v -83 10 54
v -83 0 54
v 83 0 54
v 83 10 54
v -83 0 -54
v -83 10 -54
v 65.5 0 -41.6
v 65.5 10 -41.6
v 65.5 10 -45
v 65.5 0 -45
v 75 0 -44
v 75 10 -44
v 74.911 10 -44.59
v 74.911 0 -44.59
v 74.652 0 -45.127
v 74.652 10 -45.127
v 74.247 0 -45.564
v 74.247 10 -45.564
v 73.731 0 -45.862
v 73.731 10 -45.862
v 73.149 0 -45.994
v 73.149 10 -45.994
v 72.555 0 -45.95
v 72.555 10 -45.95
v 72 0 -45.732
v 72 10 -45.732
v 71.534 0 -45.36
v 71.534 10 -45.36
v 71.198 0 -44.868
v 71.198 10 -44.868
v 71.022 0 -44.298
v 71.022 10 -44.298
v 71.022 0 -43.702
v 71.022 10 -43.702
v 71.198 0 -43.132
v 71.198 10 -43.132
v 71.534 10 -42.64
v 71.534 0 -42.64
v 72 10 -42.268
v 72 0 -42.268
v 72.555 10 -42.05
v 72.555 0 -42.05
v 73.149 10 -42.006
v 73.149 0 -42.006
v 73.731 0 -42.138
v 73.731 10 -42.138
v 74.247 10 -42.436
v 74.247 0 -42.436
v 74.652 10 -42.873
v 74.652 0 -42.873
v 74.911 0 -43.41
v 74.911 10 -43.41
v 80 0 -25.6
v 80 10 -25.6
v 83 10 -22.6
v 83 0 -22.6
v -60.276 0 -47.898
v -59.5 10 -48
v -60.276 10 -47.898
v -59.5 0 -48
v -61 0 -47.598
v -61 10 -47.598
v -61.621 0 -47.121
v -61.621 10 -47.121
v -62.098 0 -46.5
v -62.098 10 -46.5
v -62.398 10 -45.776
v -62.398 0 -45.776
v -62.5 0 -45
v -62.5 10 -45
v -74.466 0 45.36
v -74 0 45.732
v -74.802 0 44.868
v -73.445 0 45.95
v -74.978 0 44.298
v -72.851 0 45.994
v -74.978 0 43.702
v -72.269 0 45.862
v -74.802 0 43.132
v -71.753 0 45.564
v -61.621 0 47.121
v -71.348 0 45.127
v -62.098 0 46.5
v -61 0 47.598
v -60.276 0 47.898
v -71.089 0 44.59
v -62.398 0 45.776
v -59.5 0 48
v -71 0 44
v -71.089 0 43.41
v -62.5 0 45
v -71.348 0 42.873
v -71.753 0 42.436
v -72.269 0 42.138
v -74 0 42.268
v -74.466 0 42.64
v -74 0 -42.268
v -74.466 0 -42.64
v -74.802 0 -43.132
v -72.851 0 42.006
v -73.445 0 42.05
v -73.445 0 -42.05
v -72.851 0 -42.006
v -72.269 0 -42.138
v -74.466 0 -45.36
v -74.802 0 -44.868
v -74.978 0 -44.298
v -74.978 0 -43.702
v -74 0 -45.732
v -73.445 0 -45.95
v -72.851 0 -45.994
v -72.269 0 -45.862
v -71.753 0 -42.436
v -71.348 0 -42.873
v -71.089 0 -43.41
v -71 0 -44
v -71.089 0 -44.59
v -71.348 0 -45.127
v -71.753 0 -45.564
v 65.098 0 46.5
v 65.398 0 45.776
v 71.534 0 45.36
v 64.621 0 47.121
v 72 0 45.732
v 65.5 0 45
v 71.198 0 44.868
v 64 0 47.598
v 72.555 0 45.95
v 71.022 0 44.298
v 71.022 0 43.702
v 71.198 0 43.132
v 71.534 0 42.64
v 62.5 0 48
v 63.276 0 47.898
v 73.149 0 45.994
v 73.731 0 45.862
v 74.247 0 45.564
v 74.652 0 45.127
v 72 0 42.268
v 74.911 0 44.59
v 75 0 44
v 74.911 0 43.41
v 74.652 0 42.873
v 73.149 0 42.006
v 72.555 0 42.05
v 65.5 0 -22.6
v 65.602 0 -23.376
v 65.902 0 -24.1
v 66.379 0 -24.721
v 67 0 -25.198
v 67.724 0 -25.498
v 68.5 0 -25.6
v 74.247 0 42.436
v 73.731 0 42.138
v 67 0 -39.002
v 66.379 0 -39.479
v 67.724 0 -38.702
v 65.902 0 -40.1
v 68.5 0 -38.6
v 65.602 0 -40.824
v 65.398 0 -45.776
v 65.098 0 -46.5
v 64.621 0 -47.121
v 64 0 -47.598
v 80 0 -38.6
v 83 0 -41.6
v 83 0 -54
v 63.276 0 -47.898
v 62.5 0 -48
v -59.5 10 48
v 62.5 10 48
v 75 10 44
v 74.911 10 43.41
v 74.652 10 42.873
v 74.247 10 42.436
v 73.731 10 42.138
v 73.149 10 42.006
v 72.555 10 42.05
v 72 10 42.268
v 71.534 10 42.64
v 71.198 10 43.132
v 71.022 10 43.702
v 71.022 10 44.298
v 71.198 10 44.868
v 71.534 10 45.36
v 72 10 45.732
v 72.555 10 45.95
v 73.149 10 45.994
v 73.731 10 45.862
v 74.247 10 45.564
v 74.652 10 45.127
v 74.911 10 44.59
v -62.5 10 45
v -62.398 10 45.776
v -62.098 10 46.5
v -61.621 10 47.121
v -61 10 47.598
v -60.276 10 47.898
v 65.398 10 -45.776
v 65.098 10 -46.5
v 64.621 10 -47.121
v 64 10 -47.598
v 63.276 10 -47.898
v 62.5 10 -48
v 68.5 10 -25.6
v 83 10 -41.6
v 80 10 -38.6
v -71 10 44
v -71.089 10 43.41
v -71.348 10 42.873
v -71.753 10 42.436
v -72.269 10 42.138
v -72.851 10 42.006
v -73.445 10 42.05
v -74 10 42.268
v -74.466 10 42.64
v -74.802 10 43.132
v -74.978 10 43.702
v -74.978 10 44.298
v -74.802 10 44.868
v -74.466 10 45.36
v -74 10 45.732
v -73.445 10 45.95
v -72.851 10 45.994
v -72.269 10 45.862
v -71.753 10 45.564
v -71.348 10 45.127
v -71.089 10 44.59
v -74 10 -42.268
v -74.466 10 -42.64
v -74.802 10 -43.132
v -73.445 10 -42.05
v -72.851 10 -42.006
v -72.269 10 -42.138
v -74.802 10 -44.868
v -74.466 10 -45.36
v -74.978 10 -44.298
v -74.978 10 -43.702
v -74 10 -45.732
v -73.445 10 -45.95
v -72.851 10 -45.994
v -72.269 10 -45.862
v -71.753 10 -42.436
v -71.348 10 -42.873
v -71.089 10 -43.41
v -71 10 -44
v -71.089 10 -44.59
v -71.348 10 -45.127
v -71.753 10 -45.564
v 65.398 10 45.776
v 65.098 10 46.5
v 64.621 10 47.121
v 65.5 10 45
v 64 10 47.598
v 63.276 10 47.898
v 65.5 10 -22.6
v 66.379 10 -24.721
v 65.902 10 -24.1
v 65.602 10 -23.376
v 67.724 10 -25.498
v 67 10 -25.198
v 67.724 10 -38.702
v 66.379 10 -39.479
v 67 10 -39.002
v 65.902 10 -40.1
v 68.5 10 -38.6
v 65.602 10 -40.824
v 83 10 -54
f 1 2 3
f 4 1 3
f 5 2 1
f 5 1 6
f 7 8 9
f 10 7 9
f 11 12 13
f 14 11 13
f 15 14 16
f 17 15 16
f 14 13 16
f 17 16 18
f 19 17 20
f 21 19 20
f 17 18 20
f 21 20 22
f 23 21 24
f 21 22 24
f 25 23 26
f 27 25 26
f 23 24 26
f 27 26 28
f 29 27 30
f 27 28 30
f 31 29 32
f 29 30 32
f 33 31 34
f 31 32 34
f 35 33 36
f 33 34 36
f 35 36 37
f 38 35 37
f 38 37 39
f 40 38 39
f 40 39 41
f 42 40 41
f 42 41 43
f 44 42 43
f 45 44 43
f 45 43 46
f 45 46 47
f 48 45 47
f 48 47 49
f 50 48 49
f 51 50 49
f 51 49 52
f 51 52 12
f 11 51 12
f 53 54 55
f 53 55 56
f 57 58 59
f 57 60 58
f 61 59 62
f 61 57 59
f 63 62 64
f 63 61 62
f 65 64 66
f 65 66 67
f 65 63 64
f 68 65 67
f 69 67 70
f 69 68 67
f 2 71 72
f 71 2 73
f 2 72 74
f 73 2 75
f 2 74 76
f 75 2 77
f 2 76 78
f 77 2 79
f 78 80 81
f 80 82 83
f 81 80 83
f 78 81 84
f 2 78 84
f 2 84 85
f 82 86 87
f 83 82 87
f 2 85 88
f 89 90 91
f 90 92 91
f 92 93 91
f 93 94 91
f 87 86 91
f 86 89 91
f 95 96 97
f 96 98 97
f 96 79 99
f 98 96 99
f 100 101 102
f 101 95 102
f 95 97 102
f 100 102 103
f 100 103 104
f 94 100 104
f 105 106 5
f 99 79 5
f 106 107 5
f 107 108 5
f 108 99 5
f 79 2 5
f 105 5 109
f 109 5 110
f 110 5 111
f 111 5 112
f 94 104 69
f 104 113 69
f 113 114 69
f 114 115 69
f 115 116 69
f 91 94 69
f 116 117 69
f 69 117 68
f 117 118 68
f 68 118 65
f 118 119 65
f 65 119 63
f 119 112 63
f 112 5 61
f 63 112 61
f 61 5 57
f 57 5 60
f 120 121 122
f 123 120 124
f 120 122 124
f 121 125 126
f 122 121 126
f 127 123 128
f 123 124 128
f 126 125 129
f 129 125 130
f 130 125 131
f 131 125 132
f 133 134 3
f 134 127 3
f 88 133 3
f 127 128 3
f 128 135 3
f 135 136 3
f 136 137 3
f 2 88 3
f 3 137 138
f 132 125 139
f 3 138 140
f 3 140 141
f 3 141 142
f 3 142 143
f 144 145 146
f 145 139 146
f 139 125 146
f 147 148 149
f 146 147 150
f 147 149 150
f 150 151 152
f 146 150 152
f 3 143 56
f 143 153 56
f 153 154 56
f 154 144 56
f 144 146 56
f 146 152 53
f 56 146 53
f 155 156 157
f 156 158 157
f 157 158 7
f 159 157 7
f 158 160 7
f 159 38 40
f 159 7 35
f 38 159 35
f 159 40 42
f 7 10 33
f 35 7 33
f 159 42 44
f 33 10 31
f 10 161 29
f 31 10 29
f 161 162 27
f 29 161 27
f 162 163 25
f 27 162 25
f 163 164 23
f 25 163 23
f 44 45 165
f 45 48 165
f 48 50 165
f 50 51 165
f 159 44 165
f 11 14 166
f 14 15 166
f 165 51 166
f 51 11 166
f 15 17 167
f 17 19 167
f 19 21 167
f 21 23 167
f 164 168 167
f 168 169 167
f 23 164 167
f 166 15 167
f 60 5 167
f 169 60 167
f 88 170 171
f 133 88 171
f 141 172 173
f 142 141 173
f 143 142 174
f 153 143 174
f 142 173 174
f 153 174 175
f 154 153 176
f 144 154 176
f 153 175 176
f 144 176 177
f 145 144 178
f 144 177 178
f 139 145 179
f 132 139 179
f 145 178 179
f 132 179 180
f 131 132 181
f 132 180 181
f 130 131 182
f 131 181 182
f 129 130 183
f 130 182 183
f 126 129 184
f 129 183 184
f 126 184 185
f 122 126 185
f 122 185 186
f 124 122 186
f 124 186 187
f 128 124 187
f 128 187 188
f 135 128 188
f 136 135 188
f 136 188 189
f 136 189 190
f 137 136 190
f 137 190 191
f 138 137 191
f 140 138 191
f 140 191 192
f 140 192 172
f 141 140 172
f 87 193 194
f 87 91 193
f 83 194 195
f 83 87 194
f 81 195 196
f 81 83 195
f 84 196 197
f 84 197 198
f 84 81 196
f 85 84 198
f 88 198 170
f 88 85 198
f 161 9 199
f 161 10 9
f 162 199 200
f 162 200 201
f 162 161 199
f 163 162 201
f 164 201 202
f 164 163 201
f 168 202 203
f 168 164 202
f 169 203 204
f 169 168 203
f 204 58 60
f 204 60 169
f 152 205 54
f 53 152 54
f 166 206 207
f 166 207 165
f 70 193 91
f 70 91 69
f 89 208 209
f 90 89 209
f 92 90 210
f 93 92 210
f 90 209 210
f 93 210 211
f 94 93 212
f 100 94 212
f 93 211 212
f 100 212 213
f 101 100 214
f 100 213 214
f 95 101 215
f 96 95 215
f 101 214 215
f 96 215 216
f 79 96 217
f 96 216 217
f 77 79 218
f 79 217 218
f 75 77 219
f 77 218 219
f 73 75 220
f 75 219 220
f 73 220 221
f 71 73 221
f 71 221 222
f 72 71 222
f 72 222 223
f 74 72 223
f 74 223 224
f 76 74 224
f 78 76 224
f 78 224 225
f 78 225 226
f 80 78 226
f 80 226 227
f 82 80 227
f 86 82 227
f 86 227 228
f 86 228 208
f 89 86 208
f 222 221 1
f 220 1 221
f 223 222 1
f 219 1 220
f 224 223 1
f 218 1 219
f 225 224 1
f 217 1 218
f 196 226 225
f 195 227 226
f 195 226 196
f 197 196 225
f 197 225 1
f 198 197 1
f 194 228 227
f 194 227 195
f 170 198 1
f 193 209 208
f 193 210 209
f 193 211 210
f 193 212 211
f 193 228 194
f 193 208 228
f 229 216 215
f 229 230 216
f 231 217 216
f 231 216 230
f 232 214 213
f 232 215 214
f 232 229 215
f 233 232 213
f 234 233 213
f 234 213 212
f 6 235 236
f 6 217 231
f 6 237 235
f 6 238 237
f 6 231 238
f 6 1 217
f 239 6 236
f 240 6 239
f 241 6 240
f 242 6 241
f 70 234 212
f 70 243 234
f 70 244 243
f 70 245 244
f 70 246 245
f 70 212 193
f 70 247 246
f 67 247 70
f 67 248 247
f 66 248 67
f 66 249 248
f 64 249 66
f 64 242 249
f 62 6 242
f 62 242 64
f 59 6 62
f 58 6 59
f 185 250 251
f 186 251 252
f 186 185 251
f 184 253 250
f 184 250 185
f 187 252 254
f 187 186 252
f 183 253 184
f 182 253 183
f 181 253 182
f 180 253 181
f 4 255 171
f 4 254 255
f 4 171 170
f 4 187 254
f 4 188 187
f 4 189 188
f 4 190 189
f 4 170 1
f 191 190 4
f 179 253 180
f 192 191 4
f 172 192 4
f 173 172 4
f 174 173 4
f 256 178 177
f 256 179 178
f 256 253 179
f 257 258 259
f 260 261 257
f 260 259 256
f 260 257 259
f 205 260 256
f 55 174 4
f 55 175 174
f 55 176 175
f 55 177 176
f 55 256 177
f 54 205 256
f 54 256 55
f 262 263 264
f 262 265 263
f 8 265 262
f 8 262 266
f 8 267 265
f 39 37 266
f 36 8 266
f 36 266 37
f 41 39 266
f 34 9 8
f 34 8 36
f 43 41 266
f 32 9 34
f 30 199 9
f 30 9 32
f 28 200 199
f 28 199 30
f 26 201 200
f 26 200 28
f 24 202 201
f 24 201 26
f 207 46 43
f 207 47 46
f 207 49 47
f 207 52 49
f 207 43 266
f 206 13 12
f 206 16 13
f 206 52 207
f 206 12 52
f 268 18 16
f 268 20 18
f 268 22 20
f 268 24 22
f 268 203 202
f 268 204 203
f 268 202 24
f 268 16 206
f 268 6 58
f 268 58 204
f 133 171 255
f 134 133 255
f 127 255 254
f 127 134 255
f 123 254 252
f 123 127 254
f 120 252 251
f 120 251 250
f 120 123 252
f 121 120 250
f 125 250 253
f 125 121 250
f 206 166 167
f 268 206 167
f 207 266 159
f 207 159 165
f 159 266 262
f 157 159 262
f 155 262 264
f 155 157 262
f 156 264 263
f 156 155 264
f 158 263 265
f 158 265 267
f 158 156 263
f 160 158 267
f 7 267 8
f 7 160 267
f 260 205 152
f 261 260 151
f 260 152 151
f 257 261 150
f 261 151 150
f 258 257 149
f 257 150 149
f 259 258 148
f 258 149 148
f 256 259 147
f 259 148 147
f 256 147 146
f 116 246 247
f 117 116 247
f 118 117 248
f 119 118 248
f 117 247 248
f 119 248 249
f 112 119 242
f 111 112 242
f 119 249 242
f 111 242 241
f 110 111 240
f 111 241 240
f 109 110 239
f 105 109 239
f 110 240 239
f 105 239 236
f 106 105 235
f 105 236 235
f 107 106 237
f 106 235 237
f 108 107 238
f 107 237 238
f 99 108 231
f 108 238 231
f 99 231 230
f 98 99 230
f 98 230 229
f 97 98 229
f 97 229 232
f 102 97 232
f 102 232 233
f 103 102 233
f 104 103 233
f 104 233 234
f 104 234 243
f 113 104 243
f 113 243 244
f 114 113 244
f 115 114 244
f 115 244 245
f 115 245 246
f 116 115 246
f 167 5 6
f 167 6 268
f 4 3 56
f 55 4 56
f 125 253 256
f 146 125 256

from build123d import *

# Parameters (mm, degrees)
SKETCH_1_W             = 166
SKETCH_1_H             = 108
EXTRUDE_1_DEPTH        = 10
SKETCH_2_R             = 2
CUT_EXTRUDE_834_DEPTH  = 11
SKETCH_4_W             = 128
SKETCH_4_H             = 96
CUT_EXTRUDE_1103_DEPTH = 11
SKETCH_5_W             = 17.5
SKETCH_5_H             = 13
USB_DEPTH              = 11
FILLET_1_R             = 3
CHAMFER_1_SIZE         = 3
FILLET_2_R             = 3


with BuildPart() as part:
    # Эскиз1 → Бобышка-Вытянуть1 (new body)
    with BuildSketch(Plane(origin=(0, 0, 0), x_dir=(1, 0, 0), z_dir=(0, 1, 0))):
        Rectangle(SKETCH_1_W, SKETCH_1_H)
    extrude(amount=EXTRUDE_1_DEPTH)

    # Эскиз2 → Cut-Extrude 834 (cut, through all)
    with BuildSketch(Plane(origin=(0, 10, 0), x_dir=(1, 0, 0), z_dir=(0, 1, 0))):
        with Locations((-73, 44)):
            Circle(SKETCH_2_R)
        with Locations((73, 44)):
            Circle(SKETCH_2_R)
        with Locations((-73, -44)):
            Circle(SKETCH_2_R)
        with Locations((73, -44)):
            Circle(SKETCH_2_R)
    extrude(amount=-CUT_EXTRUDE_834_DEPTH, mode=Mode.SUBTRACT)

    # Эскиз4 → Cut-Extrude 1103 (cut, through all)
    with BuildSketch(Plane(origin=(0, 10, 0), x_dir=(1, 0, 0), z_dir=(0, 1, 0))):
        with Locations((1.5, 0)):
            Rectangle(SKETCH_4_W, SKETCH_4_H)
    extrude(amount=-CUT_EXTRUDE_1103_DEPTH, mode=Mode.SUBTRACT)

    # Эскиз5 → usb (cut, through all)
    with BuildSketch(Plane(origin=(0, 10, 0), x_dir=(1, 0, 0), z_dir=(0, 1, 0))):
        with Locations((74.25, 32.1)):
            Rectangle(SKETCH_5_W, SKETCH_5_H)
    extrude(amount=-USB_DEPTH, mode=Mode.SUBTRACT)

    # Скругление1
    fillet_1_edges = [part.edges().sort_by_distance(p)[0] for p in [
        (65.5, 5, -48),
        (65.5, 5, 48),
        (-62.5, 5, 48),
        (-62.5, 5, -48),
    ]]
    fillet(fillet_1_edges, radius=FILLET_1_R)

    # Фаска1
    chamfer_1_edges = [part.edges().sort_by_distance(p)[0] for p in [
        (83, 5, -38.6),
        (83, 5, -25.6),
    ]]
    chamfer(chamfer_1_edges, length=CHAMFER_1_SIZE)

    # Скругление2
    fillet_2_edges = [part.edges().sort_by_distance(p)[0] for p in [
        (65.5, 5, -25.6),
        (65.5, 5, -38.6),
    ]]
    fillet(fillet_2_edges, radius=FILLET_2_R)


solid = part.part
